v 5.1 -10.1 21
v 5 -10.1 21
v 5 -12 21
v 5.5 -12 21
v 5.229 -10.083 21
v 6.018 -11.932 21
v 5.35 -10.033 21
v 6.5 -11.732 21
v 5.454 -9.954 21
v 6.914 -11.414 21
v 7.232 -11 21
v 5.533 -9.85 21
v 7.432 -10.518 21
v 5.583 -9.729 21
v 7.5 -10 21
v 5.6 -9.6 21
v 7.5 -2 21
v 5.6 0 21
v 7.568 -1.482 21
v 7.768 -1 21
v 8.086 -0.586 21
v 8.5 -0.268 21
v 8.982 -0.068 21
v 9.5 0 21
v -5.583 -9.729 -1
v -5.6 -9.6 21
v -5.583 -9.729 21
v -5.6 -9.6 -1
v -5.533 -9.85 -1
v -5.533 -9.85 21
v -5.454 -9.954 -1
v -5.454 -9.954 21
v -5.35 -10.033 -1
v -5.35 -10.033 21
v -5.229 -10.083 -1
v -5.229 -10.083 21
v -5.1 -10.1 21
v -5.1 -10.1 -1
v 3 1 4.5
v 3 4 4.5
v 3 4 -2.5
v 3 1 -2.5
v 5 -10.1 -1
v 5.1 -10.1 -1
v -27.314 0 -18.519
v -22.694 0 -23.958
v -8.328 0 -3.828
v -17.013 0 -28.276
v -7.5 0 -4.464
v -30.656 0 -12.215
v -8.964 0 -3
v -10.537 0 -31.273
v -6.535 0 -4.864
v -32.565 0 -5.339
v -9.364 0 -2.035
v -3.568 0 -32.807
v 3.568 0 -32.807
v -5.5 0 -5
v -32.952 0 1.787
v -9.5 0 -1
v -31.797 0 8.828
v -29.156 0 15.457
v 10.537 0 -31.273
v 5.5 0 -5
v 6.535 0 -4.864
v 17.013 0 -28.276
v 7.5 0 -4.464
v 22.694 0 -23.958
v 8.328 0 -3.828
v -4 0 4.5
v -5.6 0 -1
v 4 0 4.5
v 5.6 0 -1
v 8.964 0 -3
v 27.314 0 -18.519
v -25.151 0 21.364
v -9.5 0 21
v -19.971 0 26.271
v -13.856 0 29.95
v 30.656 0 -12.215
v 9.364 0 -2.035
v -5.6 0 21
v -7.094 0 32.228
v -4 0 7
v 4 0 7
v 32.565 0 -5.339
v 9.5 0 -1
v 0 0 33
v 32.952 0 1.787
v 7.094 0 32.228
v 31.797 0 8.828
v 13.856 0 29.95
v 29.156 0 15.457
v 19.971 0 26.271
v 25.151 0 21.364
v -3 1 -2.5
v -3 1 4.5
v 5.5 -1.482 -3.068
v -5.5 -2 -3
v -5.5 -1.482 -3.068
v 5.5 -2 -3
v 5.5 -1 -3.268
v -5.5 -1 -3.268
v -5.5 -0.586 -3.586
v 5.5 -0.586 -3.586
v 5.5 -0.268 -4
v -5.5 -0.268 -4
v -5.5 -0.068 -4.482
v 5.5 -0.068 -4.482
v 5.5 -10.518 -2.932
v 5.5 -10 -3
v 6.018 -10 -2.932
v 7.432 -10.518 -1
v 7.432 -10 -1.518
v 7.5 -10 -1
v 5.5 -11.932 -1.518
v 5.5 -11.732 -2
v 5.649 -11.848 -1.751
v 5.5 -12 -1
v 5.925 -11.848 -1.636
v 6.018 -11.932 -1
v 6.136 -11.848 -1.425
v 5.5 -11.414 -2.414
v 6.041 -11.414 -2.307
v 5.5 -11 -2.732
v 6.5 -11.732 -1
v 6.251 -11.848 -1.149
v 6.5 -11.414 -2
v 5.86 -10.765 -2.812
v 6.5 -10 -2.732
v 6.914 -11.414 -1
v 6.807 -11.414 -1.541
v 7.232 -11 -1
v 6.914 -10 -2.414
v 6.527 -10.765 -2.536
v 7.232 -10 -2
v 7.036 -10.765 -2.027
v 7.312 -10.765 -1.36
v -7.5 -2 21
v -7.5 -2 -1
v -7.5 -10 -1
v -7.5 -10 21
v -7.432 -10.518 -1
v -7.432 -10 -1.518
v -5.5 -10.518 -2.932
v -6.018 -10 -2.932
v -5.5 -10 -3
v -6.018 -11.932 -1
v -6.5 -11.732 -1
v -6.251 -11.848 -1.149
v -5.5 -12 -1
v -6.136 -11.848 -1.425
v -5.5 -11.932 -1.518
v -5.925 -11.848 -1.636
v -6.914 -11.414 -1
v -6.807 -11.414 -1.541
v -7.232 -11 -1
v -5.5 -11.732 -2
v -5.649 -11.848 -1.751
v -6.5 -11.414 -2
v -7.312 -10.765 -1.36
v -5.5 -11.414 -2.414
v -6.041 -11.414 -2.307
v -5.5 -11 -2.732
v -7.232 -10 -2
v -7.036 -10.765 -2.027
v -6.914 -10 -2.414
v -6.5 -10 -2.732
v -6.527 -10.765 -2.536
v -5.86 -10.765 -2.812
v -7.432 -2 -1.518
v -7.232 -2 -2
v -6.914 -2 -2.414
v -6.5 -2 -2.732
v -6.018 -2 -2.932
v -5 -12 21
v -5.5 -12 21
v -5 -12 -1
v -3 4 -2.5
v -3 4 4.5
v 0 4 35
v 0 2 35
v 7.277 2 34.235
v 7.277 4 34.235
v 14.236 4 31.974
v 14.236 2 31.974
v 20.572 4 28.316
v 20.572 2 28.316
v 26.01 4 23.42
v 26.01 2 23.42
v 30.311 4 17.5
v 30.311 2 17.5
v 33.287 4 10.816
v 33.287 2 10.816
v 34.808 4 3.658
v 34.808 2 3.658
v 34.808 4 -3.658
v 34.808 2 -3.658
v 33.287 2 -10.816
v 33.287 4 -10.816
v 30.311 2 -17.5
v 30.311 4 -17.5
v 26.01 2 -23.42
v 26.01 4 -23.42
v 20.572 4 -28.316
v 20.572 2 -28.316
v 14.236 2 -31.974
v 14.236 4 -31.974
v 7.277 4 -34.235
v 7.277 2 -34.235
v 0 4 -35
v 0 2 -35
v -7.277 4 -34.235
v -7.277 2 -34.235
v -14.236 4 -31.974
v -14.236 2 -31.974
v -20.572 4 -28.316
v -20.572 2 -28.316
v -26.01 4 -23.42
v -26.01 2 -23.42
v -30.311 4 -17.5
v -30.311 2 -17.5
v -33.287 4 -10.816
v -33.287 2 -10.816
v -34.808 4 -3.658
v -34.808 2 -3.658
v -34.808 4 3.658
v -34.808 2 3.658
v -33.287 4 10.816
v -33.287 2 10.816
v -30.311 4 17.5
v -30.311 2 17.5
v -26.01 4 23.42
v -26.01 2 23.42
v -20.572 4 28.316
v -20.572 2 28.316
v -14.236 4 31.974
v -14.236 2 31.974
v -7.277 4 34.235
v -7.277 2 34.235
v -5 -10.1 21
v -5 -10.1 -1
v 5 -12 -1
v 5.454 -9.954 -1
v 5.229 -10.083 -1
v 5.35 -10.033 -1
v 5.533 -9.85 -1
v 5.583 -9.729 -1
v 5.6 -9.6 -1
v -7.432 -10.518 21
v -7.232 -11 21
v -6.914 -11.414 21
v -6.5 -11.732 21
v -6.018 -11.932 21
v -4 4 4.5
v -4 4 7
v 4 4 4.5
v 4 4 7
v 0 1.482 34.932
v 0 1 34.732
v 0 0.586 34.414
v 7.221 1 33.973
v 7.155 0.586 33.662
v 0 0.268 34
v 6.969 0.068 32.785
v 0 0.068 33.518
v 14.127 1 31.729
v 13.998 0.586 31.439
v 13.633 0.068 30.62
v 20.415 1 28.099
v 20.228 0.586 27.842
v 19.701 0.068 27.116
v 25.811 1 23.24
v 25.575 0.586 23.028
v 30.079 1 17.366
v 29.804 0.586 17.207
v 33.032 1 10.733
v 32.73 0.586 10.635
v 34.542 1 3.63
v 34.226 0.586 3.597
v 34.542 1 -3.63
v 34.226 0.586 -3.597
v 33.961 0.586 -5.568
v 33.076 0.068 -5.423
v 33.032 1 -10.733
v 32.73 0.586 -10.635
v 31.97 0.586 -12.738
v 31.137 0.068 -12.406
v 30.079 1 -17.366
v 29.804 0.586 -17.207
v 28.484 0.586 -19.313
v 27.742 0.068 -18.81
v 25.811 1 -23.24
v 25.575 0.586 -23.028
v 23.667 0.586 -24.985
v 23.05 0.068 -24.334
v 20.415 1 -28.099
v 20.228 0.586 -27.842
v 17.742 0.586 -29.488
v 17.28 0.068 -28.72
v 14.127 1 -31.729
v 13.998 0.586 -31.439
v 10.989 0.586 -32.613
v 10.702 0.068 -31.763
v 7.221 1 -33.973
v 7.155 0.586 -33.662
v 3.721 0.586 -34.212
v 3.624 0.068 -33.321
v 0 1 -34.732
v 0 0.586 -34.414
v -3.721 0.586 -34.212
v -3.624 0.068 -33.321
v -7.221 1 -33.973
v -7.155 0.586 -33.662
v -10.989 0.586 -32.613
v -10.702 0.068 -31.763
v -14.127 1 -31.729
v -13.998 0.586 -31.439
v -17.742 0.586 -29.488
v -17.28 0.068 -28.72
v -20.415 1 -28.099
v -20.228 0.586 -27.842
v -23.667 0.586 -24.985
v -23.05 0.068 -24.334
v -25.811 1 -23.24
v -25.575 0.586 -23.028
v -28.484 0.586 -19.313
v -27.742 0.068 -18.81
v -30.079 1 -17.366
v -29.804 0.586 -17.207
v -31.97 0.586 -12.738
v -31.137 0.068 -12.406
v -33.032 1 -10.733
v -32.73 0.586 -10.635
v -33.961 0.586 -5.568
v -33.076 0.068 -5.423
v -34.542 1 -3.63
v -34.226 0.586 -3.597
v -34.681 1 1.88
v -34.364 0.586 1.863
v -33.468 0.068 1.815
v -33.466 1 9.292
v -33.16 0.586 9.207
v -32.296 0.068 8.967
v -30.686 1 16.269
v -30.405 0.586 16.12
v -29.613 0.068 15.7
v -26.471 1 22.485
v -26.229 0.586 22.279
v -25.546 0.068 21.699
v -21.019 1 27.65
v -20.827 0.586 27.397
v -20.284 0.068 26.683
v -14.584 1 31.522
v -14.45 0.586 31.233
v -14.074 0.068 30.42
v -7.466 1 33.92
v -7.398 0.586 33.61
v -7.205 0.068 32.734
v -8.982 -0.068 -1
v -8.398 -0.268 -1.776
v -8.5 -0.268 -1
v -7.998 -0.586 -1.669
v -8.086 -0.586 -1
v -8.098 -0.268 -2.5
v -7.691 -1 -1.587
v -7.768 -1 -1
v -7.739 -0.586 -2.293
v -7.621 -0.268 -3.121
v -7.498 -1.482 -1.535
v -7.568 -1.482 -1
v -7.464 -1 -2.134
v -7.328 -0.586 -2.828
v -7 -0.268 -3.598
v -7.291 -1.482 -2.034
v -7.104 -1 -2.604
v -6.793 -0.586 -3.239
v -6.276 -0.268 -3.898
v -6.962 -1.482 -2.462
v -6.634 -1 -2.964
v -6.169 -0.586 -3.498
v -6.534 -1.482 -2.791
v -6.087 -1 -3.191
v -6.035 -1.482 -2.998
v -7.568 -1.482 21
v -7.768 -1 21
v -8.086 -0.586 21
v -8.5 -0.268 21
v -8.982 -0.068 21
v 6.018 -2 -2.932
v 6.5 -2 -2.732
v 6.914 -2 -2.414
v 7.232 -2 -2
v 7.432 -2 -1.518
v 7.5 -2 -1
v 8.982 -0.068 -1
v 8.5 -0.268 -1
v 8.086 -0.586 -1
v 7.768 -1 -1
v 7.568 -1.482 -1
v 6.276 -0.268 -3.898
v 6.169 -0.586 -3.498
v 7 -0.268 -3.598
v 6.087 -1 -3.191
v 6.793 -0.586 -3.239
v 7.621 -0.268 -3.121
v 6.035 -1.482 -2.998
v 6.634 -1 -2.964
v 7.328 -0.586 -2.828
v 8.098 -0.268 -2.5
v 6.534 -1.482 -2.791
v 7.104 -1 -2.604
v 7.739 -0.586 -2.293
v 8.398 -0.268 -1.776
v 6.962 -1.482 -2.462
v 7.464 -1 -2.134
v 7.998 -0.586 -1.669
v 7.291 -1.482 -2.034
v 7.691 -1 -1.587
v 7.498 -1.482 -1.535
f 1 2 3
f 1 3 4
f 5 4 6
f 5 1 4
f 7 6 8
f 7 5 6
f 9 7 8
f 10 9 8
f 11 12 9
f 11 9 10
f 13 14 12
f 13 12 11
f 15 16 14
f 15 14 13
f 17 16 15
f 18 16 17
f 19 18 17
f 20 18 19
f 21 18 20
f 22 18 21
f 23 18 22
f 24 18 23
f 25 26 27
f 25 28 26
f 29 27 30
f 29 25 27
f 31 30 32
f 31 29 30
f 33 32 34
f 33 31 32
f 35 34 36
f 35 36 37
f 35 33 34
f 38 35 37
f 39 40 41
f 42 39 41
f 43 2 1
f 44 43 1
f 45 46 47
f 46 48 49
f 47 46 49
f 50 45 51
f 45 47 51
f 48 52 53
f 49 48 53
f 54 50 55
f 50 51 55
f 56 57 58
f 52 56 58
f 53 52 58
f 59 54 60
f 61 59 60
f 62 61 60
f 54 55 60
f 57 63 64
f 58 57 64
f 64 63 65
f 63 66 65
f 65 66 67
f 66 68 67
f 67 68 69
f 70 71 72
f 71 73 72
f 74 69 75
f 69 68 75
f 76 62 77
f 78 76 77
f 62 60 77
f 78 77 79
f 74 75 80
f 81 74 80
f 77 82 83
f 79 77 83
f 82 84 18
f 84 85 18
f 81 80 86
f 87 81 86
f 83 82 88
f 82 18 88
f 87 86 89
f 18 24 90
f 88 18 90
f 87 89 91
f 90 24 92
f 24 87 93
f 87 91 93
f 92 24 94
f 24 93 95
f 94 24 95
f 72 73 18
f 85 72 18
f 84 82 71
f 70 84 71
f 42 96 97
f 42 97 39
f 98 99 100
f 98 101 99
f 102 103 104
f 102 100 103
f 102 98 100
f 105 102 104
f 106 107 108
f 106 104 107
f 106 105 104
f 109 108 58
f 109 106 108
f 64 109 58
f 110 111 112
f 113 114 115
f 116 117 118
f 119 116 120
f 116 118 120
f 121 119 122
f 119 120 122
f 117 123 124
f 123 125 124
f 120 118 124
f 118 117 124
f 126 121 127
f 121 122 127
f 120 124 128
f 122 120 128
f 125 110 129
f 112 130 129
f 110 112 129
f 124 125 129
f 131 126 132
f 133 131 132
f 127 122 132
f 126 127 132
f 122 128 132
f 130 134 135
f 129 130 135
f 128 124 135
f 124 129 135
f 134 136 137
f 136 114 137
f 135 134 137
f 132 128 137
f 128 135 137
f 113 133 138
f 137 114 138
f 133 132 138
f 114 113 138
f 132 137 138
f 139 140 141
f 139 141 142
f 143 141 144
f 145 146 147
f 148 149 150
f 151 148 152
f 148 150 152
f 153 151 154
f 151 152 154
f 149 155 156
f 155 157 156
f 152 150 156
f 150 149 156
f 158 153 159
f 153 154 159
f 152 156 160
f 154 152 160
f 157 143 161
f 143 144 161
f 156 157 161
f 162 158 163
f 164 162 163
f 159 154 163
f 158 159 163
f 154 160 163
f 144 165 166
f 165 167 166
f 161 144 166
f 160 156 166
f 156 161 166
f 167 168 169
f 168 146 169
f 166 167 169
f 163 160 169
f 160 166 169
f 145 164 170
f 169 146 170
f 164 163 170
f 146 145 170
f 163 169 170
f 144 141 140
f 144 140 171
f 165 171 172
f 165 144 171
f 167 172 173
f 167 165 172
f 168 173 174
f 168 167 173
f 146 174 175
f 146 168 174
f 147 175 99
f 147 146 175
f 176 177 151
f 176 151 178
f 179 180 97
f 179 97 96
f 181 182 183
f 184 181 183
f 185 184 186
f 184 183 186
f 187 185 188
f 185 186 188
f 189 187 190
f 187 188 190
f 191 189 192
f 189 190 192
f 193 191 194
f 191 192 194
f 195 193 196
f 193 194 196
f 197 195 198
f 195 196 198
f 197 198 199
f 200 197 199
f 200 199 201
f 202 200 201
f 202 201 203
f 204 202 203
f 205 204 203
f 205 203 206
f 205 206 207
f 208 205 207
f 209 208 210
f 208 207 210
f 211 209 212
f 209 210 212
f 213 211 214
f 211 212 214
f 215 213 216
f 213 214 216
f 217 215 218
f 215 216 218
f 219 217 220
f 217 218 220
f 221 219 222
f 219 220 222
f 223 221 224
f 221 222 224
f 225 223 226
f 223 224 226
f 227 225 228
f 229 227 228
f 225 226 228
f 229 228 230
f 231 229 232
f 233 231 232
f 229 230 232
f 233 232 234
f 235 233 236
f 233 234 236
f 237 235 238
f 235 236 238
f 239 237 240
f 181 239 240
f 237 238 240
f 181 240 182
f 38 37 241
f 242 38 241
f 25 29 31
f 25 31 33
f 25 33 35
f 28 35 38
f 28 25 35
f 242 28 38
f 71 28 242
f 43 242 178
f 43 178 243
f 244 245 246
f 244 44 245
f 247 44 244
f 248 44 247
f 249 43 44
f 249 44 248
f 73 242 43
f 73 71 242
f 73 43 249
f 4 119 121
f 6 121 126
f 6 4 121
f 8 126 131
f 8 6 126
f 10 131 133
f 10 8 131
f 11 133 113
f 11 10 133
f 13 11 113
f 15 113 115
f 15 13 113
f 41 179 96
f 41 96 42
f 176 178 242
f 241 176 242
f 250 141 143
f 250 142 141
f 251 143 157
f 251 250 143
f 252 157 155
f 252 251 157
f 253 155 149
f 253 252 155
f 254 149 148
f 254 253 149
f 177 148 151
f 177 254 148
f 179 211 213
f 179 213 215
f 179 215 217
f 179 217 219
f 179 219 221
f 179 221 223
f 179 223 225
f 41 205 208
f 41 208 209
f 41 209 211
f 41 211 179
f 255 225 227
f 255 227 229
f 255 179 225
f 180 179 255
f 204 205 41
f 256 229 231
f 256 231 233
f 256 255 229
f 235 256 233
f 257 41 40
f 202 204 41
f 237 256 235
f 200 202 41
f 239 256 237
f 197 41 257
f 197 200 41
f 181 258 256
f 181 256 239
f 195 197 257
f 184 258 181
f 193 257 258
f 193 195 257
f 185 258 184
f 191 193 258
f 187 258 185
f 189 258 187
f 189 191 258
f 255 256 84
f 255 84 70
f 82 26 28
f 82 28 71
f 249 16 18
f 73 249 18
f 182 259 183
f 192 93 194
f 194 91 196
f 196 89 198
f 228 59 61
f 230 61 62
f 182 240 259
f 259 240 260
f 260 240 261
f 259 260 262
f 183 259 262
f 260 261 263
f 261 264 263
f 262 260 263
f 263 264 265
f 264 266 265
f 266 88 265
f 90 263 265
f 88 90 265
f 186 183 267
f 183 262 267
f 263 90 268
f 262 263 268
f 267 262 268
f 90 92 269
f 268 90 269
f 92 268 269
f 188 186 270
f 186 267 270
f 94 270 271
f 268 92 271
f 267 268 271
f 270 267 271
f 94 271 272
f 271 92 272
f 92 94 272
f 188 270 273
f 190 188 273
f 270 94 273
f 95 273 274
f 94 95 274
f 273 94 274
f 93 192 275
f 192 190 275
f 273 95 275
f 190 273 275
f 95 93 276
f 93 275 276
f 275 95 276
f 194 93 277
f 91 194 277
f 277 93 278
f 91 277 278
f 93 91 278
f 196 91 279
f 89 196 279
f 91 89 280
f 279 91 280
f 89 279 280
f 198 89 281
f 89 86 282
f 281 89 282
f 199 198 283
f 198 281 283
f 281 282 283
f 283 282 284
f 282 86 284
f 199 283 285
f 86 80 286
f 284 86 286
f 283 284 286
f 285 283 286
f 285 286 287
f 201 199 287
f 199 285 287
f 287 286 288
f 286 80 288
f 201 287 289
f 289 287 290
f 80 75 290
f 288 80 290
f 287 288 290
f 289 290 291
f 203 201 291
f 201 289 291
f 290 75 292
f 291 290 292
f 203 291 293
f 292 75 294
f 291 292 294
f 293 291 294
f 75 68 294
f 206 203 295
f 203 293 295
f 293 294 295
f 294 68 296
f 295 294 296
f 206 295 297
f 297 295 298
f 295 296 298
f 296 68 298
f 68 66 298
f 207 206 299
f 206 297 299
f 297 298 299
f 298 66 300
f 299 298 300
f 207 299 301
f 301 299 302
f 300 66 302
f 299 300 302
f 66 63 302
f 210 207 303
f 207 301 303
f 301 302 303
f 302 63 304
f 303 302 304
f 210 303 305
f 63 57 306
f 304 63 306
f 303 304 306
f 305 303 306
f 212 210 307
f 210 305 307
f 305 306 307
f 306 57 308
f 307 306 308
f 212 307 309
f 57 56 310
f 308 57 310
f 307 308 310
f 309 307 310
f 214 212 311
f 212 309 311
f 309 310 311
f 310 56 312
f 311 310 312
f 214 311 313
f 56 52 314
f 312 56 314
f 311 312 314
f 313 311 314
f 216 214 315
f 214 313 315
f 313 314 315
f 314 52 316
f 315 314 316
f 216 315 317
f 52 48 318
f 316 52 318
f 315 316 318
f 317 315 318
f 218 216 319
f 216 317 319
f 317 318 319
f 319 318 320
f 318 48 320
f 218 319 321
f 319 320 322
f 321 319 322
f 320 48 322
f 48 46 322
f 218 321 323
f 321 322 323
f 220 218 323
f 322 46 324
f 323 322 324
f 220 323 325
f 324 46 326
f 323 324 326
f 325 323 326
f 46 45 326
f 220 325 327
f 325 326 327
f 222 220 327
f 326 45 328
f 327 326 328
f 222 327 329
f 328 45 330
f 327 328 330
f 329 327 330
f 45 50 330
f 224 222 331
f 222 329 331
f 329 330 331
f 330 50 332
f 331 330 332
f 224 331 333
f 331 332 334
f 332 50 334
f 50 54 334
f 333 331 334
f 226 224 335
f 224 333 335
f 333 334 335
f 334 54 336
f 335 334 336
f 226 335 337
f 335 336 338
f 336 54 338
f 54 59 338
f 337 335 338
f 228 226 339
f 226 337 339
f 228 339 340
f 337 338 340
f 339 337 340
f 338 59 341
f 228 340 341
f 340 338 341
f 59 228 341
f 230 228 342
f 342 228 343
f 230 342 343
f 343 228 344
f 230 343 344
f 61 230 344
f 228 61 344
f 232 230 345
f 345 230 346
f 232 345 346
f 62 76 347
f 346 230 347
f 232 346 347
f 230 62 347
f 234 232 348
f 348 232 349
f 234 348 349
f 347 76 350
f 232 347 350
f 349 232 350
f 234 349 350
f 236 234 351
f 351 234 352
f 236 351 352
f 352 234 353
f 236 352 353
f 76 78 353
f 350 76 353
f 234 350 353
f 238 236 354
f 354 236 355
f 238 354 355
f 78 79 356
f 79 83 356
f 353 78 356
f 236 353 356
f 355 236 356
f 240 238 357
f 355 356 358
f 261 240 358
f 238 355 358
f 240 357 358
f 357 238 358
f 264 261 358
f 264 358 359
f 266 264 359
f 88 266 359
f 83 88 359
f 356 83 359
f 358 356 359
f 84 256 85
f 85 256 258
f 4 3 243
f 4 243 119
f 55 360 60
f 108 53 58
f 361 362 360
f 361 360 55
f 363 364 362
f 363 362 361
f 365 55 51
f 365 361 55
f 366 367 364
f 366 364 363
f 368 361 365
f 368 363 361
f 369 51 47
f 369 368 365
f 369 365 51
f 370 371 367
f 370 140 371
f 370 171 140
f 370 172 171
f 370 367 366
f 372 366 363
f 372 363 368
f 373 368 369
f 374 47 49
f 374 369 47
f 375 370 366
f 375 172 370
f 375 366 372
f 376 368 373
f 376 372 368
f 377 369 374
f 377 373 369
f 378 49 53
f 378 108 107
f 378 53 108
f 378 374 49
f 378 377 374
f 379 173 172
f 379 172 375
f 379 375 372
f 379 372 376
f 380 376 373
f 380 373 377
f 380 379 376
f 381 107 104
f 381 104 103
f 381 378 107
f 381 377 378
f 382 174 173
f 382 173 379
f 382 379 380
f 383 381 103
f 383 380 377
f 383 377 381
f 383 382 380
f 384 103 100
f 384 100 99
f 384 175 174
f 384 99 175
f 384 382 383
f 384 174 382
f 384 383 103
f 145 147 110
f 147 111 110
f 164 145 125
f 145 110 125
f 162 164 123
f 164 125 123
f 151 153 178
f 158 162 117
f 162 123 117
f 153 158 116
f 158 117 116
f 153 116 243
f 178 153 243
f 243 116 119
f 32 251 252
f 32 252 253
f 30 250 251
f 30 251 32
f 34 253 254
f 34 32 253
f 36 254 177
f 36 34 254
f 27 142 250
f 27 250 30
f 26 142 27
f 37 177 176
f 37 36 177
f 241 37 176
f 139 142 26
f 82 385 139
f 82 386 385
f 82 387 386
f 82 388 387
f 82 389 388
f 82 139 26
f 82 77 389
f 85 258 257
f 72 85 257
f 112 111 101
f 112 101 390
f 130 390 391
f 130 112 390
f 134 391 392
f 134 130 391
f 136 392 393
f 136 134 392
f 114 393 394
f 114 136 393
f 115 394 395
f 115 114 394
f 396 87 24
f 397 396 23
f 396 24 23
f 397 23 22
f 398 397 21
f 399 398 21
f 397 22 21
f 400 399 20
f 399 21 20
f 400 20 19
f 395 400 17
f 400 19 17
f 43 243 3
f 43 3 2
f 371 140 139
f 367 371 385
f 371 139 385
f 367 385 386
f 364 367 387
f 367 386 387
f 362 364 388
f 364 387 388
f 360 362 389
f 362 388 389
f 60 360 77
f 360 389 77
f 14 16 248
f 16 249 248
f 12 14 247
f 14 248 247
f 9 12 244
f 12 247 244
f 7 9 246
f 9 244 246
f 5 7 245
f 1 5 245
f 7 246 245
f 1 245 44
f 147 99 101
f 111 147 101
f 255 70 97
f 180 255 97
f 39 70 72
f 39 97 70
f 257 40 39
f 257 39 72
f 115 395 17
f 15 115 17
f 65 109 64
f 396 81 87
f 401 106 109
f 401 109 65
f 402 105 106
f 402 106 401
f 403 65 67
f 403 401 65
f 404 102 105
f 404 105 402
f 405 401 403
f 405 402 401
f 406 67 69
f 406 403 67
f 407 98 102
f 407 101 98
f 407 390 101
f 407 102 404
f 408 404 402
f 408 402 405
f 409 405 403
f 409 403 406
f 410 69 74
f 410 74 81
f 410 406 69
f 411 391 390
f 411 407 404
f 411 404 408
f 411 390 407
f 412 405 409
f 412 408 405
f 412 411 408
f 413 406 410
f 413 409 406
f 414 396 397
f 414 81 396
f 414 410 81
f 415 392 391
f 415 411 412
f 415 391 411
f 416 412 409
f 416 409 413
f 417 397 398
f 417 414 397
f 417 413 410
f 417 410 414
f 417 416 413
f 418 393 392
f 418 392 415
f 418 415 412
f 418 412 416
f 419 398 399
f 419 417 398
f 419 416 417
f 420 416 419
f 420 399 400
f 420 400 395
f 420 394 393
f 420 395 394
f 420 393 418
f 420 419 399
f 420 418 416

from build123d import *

# Parameters (mm, degrees)
SKETCH1_R                  = 35
ROUND_BODY_DEPTH           = 4
FILLET1_R                  = 2
SKETCH2_W                  = 6
SKETCH2_H                  = 7
SENSOR_SQUARE_HOLE_DEPTH   = 3
SKETCH4_W                  = 8
SKETCH4_H                  = 2.5
SENSOR_LEAD_HOLE_DEPTH     = 4
SKETCH5_W                  = 15
SKETCH5_H                  = 24
BACK_HOLDER_DEPTH          = 12
SKETCH6_W                  = 11.2
SKETCH6_H                  = 10.1
HOLDER_SLOT_DEPTH          = 22
HOLDER_ROUNDS_R            = 2
SKETCH7_W                  = 10
SKETCH7_H                  = 1.9
HOLDER_TOP_REMOVAL_DEPTH   = 22
HOLDER_MICRO_TOP_FILLETS_R = 0.5


with BuildPart() as part:
    # Sketch1 → Round Body (new body)
    with BuildSketch(Plane(origin=(0, 0, 0), x_dir=(1, 0, 0), z_dir=(0, 1, 0))):
        with Locations(Location((0, 0, 0), (0, 0, 270))):
            Circle(SKETCH1_R)
    extrude(amount=ROUND_BODY_DEPTH)

    # Fillet1
    fillet1_edges = [part.edges().sort_by_distance(p)[0] for p in [
        (0, 0, -35),
    ]]
    fillet(fillet1_edges, radius=FILLET1_R)

    # Sketch2 → Sensor Square Hole (cut)
    with BuildSketch(Plane(origin=(0, 4, 0), x_dir=(1, 0, 0), z_dir=(0, 1, 0))):
        with Locations((0, -1)):
            Rectangle(SKETCH2_W, SKETCH2_H)
    extrude(amount=-SENSOR_SQUARE_HOLE_DEPTH, mode=Mode.SUBTRACT)

    # Sketch4 → Sensor Lead Hole (cut)
    with BuildSketch(Plane(origin=(0, 4, 0), x_dir=(1, 0, 0), z_dir=(0, 1, 0))):
        with Locations((0, -5.75)):
            Rectangle(SKETCH4_W, SKETCH4_H)
    extrude(amount=-SENSOR_LEAD_HOLE_DEPTH, mode=Mode.SUBTRACT)

    # Sketch5 → Back Holder (add)
    with BuildSketch(Plane.XZ):
        with Locations((0, 9)):
            Rectangle(SKETCH5_W, SKETCH5_H)
    extrude(amount=BACK_HOLDER_DEPTH)

    # Sketch6 → Holder Slot (cut)
    with BuildSketch(Plane.XY.offset(21)):
        with Locations((0, -5.05)):
            Rectangle(SKETCH6_W, SKETCH6_H)
    extrude(amount=-HOLDER_SLOT_DEPTH, mode=Mode.SUBTRACT)

    # Holder Rounds
    holder_rounds_edges = [part.edges().sort_by_distance(p)[0] for p in [
        (-7.5, 0, 9),
        (0, 0, -3),
        (-7.5, -6, -3),
        (7.5, 0, 9),
        (7.5, -6, -3),
        (-7.5, -12, 9),
        (0, -12, -3),
        (7.5, -12, 9),
    ]]
    fillet(holder_rounds_edges, radius=HOLDER_ROUNDS_R)

    # Sketch7 → Holder Top Removal (cut)
    with BuildSketch(Plane.XY.offset(21)):
        with Locations((0, -11.05)):
            Rectangle(SKETCH7_W, SKETCH7_H)
    extrude(amount=-HOLDER_TOP_REMOVAL_DEPTH, mode=Mode.SUBTRACT)

    # Holder Micro Top fillets
    holder_micro_top_fillets_edges = [part.edges().sort_by_distance(p)[0] for p in [
        (-5.6, -10.1, 10),
        (5.6, -10.1, 10),
    ]]
    fillet(holder_micro_top_fillets_edges, radius=HOLDER_MICRO_TOP_FILLETS_R)


solid = part.part
